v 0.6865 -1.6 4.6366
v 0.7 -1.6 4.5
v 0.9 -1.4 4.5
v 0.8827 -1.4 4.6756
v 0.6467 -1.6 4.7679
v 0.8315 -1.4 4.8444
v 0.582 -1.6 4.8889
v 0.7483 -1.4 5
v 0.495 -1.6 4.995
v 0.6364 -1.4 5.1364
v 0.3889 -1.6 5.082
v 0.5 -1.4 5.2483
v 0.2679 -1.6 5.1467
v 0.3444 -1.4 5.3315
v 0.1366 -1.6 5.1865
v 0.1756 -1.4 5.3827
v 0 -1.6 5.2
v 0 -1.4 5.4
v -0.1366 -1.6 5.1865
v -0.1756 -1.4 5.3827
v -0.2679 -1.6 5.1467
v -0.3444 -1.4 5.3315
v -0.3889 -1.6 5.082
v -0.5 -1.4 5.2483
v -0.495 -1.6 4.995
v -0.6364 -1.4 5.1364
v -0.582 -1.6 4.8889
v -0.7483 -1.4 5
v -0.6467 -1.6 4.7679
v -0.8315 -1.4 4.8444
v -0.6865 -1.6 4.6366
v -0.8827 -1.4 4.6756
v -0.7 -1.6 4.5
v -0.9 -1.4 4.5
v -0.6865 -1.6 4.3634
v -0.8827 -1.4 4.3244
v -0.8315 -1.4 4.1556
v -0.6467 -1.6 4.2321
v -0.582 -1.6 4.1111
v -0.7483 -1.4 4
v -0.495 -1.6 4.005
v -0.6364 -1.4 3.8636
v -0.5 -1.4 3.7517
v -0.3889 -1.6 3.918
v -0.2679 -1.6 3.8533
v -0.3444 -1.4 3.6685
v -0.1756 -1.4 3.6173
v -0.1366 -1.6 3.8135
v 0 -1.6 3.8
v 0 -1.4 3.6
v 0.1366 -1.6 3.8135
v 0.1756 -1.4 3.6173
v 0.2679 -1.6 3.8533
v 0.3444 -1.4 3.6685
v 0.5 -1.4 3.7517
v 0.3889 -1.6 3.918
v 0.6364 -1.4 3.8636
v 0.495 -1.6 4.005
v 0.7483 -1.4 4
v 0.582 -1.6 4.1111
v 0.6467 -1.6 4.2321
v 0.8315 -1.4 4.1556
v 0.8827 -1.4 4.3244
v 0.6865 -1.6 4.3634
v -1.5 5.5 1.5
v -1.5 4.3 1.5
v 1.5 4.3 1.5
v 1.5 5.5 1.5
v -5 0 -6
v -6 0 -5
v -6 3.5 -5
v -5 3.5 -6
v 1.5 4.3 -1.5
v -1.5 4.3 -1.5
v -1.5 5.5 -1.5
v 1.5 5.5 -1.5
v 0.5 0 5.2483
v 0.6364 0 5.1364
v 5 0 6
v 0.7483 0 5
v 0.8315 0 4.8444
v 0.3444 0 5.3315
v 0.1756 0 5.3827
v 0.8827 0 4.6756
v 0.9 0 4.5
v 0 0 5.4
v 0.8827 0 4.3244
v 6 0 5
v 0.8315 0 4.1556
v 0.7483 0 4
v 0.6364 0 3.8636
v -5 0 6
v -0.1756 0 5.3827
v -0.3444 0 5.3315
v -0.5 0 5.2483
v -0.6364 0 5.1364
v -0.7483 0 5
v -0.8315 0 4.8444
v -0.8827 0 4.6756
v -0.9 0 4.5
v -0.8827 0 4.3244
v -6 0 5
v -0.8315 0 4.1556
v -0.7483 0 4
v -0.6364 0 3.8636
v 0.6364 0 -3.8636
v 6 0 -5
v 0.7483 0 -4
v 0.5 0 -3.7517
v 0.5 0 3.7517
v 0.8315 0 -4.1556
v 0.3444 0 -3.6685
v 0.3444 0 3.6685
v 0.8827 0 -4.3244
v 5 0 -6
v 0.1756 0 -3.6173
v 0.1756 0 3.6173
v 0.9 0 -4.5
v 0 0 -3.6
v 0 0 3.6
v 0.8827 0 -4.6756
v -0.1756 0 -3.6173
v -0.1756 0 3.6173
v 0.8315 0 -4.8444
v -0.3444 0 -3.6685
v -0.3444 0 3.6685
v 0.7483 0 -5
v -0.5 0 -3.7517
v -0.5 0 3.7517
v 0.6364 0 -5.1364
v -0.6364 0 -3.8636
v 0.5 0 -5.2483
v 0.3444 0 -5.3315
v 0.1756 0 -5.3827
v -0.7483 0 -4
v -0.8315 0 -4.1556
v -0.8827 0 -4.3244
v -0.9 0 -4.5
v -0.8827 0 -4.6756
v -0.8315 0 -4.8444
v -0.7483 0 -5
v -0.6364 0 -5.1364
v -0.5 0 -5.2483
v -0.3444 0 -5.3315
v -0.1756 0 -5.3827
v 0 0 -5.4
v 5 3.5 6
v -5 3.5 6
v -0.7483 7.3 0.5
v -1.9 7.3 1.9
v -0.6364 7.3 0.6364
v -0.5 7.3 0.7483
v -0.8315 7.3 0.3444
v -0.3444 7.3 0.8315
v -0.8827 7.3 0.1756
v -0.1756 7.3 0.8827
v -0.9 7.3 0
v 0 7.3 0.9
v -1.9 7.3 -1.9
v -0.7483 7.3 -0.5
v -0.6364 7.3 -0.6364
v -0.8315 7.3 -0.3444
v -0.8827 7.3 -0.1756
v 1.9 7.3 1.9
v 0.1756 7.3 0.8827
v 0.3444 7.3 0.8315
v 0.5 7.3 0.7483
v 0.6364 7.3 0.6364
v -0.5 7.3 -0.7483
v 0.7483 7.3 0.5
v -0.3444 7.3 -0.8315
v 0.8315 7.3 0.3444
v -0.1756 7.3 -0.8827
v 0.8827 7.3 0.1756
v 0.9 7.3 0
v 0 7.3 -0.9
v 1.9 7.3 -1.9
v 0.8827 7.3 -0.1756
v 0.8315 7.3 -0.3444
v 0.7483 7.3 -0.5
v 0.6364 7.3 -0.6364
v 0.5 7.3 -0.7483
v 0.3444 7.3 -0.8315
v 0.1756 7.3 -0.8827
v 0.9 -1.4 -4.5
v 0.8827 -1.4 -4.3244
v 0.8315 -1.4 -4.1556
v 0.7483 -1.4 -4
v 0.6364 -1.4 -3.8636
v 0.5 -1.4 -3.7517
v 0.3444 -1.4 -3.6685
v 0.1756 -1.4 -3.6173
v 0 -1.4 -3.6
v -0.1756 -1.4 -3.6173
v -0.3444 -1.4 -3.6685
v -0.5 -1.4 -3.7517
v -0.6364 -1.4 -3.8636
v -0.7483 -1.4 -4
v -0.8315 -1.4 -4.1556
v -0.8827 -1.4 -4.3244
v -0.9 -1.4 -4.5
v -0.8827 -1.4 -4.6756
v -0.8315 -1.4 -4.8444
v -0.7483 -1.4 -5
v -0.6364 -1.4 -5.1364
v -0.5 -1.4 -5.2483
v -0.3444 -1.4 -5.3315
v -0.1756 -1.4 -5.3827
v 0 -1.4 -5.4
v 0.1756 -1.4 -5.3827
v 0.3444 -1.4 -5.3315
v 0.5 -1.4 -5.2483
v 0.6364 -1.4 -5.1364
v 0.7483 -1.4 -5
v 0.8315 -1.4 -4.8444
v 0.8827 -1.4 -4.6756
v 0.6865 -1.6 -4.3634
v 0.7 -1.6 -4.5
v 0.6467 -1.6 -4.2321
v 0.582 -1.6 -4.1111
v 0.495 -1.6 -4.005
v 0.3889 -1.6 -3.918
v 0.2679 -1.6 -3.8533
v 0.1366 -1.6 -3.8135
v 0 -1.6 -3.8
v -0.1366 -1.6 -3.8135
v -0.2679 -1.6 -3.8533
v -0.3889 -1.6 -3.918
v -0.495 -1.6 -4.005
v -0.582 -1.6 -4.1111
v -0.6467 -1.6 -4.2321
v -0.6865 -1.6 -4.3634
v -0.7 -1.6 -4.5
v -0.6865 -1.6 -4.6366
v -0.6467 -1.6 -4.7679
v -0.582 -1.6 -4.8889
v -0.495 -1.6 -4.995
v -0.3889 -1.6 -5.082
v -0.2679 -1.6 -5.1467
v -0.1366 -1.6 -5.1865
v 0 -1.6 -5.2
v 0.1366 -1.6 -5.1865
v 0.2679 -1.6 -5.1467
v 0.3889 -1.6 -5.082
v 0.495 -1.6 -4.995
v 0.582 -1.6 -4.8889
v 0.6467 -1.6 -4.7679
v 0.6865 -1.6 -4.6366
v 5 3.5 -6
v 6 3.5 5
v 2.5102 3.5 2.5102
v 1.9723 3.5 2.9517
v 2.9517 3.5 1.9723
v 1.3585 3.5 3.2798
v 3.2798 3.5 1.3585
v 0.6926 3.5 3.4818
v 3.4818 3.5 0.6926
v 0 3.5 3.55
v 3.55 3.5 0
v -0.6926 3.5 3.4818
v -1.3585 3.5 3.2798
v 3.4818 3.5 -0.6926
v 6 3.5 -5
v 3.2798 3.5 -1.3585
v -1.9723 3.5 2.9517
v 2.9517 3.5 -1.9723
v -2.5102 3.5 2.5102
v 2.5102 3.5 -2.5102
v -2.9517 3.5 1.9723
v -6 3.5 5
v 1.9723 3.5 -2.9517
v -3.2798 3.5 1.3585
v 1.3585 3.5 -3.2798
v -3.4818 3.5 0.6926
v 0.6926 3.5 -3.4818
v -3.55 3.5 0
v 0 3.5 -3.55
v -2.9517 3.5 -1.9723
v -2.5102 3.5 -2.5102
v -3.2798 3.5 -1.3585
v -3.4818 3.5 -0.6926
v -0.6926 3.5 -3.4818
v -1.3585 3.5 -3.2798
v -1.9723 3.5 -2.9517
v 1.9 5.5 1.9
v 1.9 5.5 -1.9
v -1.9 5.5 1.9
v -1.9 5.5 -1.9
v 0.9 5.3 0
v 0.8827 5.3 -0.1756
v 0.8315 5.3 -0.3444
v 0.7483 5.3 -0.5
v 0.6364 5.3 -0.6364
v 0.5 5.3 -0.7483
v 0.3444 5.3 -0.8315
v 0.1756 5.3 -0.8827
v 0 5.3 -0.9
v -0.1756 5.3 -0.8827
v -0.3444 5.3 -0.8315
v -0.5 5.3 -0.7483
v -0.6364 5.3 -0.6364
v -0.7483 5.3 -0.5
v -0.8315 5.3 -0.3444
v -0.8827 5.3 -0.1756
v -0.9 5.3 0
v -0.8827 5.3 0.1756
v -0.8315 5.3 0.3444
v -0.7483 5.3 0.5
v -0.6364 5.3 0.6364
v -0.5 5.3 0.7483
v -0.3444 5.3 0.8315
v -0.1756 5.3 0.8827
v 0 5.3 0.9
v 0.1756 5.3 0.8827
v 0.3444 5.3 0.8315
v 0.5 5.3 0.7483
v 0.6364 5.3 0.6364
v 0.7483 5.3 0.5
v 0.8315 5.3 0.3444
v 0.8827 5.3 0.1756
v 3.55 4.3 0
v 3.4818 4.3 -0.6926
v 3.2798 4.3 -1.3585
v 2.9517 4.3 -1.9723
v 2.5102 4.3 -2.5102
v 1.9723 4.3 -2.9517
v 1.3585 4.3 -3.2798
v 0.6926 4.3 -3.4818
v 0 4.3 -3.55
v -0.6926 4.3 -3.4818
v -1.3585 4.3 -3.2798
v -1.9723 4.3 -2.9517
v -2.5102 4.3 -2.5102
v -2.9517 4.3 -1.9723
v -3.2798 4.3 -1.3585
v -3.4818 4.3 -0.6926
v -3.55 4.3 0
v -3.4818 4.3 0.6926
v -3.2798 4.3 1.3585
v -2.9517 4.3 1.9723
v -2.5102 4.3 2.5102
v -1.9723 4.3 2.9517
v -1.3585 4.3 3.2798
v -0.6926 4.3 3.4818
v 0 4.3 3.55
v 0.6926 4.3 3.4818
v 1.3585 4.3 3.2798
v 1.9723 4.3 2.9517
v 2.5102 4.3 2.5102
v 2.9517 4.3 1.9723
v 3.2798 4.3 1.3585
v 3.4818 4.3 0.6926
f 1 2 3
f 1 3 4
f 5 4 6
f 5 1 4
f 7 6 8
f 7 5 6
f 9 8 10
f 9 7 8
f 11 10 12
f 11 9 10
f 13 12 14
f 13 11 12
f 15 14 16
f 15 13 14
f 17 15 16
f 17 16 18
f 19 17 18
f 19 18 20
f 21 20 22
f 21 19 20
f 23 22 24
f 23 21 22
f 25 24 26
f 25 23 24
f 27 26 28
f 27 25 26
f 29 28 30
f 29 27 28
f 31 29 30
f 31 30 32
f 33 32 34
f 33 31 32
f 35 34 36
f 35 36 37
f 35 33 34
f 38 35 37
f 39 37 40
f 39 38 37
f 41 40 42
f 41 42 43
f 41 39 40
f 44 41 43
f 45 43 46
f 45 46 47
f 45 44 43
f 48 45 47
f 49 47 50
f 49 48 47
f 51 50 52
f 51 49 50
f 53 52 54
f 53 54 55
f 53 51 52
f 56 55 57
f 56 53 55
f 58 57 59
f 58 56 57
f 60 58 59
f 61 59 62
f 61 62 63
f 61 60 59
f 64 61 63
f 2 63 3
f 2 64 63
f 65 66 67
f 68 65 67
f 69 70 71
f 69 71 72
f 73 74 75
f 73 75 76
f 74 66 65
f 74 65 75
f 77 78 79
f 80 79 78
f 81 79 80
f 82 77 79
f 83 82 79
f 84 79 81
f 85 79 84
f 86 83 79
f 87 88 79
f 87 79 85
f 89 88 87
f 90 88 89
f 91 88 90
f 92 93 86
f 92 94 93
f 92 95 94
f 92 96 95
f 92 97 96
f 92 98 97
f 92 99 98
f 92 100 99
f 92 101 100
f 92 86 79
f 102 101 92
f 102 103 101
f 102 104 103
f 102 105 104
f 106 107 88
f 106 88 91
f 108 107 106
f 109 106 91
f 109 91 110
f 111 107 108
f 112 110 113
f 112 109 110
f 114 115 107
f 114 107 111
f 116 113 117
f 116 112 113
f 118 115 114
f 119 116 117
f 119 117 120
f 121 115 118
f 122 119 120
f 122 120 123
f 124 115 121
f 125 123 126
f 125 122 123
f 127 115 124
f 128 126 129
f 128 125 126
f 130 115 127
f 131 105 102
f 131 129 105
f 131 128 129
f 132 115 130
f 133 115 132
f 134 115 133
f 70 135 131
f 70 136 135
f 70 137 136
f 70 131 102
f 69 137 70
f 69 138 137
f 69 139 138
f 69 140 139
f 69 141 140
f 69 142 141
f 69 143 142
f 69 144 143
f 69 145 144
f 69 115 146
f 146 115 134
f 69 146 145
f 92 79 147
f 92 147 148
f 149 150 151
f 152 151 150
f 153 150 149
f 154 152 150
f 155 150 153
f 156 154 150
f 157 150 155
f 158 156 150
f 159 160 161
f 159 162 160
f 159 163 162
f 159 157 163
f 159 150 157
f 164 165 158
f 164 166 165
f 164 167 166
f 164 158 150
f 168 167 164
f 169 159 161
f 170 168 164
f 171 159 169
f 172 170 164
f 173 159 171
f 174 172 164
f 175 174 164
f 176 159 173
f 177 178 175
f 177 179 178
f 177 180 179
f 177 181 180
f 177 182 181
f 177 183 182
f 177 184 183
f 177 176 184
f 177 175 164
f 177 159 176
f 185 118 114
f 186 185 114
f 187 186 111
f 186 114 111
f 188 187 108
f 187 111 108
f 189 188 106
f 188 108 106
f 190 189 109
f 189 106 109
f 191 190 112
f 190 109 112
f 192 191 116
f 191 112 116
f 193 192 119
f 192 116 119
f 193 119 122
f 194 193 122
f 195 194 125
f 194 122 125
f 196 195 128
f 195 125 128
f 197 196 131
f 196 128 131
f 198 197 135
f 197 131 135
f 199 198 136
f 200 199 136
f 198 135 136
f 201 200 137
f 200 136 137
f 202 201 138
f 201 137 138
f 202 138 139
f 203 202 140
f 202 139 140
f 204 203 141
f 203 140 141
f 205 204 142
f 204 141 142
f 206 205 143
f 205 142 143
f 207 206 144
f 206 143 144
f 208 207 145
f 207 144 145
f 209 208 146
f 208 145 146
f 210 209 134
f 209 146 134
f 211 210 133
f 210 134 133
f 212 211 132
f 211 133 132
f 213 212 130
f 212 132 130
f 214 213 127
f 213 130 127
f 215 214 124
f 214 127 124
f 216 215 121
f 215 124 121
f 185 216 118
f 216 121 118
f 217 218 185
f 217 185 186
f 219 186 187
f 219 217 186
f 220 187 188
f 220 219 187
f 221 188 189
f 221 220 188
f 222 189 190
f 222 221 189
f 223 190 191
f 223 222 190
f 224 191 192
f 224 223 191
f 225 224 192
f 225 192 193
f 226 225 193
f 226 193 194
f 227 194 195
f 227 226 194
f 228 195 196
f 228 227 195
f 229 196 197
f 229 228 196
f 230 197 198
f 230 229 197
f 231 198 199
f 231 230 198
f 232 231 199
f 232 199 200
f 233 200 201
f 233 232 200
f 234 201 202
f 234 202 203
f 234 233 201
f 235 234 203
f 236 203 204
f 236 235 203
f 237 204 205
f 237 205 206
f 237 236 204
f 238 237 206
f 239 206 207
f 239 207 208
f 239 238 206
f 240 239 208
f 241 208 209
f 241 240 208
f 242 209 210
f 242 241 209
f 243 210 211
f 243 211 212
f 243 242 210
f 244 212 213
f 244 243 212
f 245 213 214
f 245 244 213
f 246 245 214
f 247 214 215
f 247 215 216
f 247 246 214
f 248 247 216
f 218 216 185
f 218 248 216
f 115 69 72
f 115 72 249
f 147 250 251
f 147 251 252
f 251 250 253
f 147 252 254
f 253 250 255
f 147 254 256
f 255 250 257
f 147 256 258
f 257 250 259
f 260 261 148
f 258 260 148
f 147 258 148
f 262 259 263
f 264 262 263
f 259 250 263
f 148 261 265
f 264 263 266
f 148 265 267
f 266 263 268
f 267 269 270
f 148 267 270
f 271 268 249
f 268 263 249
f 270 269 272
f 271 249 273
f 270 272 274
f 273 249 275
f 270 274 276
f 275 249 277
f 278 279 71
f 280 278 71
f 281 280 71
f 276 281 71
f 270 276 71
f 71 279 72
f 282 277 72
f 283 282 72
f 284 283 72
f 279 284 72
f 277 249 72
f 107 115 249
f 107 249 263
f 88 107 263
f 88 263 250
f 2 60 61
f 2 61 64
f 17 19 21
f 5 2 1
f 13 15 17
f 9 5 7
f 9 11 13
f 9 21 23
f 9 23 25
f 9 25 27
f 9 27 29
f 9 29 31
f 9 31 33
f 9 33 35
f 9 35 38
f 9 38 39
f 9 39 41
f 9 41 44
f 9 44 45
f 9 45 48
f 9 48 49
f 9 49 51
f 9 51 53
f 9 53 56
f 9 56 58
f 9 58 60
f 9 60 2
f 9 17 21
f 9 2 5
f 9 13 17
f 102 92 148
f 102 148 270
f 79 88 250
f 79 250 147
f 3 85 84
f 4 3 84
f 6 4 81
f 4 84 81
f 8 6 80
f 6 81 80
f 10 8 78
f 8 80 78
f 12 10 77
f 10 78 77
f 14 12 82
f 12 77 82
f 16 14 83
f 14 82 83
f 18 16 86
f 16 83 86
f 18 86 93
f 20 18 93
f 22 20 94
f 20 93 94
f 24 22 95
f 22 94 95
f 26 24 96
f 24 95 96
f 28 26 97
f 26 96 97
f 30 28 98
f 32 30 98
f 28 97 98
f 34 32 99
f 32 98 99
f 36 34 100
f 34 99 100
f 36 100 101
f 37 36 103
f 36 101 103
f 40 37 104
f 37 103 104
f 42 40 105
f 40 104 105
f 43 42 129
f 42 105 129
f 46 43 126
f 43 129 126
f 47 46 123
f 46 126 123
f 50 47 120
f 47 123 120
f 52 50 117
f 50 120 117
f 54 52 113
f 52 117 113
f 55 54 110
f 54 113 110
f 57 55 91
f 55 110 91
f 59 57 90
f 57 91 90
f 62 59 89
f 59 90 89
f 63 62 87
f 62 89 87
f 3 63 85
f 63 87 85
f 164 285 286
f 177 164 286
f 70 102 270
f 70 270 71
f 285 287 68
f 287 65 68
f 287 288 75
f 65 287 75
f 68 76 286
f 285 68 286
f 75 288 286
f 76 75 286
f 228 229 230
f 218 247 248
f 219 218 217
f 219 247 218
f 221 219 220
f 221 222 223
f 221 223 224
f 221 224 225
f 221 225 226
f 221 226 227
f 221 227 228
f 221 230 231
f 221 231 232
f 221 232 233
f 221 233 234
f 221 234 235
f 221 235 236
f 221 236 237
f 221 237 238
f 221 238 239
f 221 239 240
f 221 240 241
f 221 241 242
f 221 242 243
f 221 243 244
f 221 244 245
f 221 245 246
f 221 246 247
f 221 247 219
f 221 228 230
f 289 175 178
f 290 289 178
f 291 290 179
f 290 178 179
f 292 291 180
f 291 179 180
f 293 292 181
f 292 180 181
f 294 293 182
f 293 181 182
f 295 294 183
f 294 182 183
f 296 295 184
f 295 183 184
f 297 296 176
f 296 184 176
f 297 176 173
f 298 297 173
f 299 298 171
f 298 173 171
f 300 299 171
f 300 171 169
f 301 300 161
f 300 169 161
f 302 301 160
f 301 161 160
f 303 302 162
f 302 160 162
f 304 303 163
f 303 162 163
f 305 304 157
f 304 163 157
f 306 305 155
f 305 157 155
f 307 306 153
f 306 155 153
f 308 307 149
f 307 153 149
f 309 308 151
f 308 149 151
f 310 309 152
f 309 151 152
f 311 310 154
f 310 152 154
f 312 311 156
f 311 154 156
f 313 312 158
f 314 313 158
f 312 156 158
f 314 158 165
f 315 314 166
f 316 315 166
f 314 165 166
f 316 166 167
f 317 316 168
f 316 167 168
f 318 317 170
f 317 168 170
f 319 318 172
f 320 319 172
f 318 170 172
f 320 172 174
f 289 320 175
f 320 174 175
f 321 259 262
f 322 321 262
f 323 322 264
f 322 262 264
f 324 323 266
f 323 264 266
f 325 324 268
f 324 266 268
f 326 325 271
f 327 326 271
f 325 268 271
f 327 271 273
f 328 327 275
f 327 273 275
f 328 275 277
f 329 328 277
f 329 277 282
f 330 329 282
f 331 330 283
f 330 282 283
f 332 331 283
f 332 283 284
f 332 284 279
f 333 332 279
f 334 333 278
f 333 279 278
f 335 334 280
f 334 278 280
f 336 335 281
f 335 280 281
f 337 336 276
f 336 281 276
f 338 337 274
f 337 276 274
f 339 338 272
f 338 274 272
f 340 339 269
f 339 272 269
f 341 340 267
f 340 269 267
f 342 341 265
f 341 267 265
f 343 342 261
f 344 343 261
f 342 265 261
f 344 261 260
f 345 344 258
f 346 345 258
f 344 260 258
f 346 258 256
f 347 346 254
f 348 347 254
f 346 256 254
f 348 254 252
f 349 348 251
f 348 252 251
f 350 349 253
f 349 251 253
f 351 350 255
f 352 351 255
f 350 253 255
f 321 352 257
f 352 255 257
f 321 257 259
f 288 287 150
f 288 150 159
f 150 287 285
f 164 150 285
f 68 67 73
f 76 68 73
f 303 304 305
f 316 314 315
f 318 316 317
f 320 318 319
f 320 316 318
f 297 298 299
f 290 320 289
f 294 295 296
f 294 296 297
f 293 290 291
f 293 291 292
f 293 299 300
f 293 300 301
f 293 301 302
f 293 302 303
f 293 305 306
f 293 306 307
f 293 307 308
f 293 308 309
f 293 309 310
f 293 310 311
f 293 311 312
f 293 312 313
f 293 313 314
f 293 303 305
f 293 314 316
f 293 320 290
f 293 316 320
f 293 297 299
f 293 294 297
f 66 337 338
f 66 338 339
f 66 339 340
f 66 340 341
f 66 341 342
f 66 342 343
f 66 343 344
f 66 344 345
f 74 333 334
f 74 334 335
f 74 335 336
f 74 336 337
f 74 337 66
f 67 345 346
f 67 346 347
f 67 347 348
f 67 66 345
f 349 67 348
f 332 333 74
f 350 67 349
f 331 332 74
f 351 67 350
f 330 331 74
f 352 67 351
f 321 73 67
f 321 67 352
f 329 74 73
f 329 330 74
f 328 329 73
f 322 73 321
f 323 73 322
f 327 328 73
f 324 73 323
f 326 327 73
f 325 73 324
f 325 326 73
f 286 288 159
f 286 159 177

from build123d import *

# Parameters (mm, degrees)
BOSS_EXTRUDE1_DEPTH = 3.5
SKETCH2_R           = 0.9
BOSS_EXTRUDE2_DEPTH = 1.6
CHAMFER1_SIZE       = 0.2
SKETCH3_R           = 3.55
BOSS_EXTRUDE3_DEPTH = 0.8
SKETCH4_W           = 3
SKETCH4_H           = 3
BOSS_EXTRUDE4_DEPTH = 1.2
SKETCH5_W           = 3.8
SKETCH5_H           = 3.8
BOSS_EXTRUDE5_DEPTH = 1.8
SKETCH6_R           = 0.9
CUT_EXTRUDE1_DEPTH  = 2


with BuildPart() as part:
    # Sketch1 → Boss-Extrude1 (new body)
    with BuildSketch(Plane(origin=(0, 0, 0), x_dir=(1, 0, 0), z_dir=(0, 1, 0))):
        Polygon((-6, 5), (-5, 6), (5, 6), (6, 5), (6, -5), (5, -6), (-5, -6), (-6, -5), align=None)
    extrude(amount=BOSS_EXTRUDE1_DEPTH)

    # Sketch2 → Boss-Extrude2 (add)
    with BuildSketch(Plane.XZ):
        with Locations((0, -4.5)):
            Circle(SKETCH2_R)
        with Locations((0, 4.5)):
            Circle(SKETCH2_R)
    extrude(amount=BOSS_EXTRUDE2_DEPTH)

    # Chamfer1
    chamfer1_edges = [part.edges().sort_by_distance(p)[0] for p in [
        (-0.9, -1.6, -4.5),
        (-0.9, -1.6, 4.5),
    ]]
    chamfer(chamfer1_edges, length=CHAMFER1_SIZE)

    # Sketch3 → Boss-Extrude3 (add)
    with BuildSketch(Plane(origin=(0, 3.5, 0), x_dir=(1, 0, 0), z_dir=(0, 1, 0))):
        Circle(SKETCH3_R)
    extrude(amount=BOSS_EXTRUDE3_DEPTH)

    # Sketch4 → Boss-Extrude4 (add)
    with BuildSketch(Plane(origin=(0, 4.3, 0), x_dir=(1, 0, 0), z_dir=(0, 1, 0))):
        Rectangle(SKETCH4_W, SKETCH4_H)
    extrude(amount=BOSS_EXTRUDE4_DEPTH)

    # Sketch5 → Boss-Extrude5 (add)
    with BuildSketch(Plane(origin=(0, 5.5, 0), x_dir=(1, 0, 0), z_dir=(0, 1, 0))):
        Rectangle(SKETCH5_W, SKETCH5_H)
    extrude(amount=BOSS_EXTRUDE5_DEPTH)

    # Sketch6 → Cut-Extrude1 (cut)
    with BuildSketch(Plane(origin=(0, 7.3, 0), x_dir=(1, 0, 0), z_dir=(0, 1, 0))):
        Circle(SKETCH6_R)
    extrude(amount=-CUT_EXTRUDE1_DEPTH, mode=Mode.SUBTRACT)


solid = part.part
